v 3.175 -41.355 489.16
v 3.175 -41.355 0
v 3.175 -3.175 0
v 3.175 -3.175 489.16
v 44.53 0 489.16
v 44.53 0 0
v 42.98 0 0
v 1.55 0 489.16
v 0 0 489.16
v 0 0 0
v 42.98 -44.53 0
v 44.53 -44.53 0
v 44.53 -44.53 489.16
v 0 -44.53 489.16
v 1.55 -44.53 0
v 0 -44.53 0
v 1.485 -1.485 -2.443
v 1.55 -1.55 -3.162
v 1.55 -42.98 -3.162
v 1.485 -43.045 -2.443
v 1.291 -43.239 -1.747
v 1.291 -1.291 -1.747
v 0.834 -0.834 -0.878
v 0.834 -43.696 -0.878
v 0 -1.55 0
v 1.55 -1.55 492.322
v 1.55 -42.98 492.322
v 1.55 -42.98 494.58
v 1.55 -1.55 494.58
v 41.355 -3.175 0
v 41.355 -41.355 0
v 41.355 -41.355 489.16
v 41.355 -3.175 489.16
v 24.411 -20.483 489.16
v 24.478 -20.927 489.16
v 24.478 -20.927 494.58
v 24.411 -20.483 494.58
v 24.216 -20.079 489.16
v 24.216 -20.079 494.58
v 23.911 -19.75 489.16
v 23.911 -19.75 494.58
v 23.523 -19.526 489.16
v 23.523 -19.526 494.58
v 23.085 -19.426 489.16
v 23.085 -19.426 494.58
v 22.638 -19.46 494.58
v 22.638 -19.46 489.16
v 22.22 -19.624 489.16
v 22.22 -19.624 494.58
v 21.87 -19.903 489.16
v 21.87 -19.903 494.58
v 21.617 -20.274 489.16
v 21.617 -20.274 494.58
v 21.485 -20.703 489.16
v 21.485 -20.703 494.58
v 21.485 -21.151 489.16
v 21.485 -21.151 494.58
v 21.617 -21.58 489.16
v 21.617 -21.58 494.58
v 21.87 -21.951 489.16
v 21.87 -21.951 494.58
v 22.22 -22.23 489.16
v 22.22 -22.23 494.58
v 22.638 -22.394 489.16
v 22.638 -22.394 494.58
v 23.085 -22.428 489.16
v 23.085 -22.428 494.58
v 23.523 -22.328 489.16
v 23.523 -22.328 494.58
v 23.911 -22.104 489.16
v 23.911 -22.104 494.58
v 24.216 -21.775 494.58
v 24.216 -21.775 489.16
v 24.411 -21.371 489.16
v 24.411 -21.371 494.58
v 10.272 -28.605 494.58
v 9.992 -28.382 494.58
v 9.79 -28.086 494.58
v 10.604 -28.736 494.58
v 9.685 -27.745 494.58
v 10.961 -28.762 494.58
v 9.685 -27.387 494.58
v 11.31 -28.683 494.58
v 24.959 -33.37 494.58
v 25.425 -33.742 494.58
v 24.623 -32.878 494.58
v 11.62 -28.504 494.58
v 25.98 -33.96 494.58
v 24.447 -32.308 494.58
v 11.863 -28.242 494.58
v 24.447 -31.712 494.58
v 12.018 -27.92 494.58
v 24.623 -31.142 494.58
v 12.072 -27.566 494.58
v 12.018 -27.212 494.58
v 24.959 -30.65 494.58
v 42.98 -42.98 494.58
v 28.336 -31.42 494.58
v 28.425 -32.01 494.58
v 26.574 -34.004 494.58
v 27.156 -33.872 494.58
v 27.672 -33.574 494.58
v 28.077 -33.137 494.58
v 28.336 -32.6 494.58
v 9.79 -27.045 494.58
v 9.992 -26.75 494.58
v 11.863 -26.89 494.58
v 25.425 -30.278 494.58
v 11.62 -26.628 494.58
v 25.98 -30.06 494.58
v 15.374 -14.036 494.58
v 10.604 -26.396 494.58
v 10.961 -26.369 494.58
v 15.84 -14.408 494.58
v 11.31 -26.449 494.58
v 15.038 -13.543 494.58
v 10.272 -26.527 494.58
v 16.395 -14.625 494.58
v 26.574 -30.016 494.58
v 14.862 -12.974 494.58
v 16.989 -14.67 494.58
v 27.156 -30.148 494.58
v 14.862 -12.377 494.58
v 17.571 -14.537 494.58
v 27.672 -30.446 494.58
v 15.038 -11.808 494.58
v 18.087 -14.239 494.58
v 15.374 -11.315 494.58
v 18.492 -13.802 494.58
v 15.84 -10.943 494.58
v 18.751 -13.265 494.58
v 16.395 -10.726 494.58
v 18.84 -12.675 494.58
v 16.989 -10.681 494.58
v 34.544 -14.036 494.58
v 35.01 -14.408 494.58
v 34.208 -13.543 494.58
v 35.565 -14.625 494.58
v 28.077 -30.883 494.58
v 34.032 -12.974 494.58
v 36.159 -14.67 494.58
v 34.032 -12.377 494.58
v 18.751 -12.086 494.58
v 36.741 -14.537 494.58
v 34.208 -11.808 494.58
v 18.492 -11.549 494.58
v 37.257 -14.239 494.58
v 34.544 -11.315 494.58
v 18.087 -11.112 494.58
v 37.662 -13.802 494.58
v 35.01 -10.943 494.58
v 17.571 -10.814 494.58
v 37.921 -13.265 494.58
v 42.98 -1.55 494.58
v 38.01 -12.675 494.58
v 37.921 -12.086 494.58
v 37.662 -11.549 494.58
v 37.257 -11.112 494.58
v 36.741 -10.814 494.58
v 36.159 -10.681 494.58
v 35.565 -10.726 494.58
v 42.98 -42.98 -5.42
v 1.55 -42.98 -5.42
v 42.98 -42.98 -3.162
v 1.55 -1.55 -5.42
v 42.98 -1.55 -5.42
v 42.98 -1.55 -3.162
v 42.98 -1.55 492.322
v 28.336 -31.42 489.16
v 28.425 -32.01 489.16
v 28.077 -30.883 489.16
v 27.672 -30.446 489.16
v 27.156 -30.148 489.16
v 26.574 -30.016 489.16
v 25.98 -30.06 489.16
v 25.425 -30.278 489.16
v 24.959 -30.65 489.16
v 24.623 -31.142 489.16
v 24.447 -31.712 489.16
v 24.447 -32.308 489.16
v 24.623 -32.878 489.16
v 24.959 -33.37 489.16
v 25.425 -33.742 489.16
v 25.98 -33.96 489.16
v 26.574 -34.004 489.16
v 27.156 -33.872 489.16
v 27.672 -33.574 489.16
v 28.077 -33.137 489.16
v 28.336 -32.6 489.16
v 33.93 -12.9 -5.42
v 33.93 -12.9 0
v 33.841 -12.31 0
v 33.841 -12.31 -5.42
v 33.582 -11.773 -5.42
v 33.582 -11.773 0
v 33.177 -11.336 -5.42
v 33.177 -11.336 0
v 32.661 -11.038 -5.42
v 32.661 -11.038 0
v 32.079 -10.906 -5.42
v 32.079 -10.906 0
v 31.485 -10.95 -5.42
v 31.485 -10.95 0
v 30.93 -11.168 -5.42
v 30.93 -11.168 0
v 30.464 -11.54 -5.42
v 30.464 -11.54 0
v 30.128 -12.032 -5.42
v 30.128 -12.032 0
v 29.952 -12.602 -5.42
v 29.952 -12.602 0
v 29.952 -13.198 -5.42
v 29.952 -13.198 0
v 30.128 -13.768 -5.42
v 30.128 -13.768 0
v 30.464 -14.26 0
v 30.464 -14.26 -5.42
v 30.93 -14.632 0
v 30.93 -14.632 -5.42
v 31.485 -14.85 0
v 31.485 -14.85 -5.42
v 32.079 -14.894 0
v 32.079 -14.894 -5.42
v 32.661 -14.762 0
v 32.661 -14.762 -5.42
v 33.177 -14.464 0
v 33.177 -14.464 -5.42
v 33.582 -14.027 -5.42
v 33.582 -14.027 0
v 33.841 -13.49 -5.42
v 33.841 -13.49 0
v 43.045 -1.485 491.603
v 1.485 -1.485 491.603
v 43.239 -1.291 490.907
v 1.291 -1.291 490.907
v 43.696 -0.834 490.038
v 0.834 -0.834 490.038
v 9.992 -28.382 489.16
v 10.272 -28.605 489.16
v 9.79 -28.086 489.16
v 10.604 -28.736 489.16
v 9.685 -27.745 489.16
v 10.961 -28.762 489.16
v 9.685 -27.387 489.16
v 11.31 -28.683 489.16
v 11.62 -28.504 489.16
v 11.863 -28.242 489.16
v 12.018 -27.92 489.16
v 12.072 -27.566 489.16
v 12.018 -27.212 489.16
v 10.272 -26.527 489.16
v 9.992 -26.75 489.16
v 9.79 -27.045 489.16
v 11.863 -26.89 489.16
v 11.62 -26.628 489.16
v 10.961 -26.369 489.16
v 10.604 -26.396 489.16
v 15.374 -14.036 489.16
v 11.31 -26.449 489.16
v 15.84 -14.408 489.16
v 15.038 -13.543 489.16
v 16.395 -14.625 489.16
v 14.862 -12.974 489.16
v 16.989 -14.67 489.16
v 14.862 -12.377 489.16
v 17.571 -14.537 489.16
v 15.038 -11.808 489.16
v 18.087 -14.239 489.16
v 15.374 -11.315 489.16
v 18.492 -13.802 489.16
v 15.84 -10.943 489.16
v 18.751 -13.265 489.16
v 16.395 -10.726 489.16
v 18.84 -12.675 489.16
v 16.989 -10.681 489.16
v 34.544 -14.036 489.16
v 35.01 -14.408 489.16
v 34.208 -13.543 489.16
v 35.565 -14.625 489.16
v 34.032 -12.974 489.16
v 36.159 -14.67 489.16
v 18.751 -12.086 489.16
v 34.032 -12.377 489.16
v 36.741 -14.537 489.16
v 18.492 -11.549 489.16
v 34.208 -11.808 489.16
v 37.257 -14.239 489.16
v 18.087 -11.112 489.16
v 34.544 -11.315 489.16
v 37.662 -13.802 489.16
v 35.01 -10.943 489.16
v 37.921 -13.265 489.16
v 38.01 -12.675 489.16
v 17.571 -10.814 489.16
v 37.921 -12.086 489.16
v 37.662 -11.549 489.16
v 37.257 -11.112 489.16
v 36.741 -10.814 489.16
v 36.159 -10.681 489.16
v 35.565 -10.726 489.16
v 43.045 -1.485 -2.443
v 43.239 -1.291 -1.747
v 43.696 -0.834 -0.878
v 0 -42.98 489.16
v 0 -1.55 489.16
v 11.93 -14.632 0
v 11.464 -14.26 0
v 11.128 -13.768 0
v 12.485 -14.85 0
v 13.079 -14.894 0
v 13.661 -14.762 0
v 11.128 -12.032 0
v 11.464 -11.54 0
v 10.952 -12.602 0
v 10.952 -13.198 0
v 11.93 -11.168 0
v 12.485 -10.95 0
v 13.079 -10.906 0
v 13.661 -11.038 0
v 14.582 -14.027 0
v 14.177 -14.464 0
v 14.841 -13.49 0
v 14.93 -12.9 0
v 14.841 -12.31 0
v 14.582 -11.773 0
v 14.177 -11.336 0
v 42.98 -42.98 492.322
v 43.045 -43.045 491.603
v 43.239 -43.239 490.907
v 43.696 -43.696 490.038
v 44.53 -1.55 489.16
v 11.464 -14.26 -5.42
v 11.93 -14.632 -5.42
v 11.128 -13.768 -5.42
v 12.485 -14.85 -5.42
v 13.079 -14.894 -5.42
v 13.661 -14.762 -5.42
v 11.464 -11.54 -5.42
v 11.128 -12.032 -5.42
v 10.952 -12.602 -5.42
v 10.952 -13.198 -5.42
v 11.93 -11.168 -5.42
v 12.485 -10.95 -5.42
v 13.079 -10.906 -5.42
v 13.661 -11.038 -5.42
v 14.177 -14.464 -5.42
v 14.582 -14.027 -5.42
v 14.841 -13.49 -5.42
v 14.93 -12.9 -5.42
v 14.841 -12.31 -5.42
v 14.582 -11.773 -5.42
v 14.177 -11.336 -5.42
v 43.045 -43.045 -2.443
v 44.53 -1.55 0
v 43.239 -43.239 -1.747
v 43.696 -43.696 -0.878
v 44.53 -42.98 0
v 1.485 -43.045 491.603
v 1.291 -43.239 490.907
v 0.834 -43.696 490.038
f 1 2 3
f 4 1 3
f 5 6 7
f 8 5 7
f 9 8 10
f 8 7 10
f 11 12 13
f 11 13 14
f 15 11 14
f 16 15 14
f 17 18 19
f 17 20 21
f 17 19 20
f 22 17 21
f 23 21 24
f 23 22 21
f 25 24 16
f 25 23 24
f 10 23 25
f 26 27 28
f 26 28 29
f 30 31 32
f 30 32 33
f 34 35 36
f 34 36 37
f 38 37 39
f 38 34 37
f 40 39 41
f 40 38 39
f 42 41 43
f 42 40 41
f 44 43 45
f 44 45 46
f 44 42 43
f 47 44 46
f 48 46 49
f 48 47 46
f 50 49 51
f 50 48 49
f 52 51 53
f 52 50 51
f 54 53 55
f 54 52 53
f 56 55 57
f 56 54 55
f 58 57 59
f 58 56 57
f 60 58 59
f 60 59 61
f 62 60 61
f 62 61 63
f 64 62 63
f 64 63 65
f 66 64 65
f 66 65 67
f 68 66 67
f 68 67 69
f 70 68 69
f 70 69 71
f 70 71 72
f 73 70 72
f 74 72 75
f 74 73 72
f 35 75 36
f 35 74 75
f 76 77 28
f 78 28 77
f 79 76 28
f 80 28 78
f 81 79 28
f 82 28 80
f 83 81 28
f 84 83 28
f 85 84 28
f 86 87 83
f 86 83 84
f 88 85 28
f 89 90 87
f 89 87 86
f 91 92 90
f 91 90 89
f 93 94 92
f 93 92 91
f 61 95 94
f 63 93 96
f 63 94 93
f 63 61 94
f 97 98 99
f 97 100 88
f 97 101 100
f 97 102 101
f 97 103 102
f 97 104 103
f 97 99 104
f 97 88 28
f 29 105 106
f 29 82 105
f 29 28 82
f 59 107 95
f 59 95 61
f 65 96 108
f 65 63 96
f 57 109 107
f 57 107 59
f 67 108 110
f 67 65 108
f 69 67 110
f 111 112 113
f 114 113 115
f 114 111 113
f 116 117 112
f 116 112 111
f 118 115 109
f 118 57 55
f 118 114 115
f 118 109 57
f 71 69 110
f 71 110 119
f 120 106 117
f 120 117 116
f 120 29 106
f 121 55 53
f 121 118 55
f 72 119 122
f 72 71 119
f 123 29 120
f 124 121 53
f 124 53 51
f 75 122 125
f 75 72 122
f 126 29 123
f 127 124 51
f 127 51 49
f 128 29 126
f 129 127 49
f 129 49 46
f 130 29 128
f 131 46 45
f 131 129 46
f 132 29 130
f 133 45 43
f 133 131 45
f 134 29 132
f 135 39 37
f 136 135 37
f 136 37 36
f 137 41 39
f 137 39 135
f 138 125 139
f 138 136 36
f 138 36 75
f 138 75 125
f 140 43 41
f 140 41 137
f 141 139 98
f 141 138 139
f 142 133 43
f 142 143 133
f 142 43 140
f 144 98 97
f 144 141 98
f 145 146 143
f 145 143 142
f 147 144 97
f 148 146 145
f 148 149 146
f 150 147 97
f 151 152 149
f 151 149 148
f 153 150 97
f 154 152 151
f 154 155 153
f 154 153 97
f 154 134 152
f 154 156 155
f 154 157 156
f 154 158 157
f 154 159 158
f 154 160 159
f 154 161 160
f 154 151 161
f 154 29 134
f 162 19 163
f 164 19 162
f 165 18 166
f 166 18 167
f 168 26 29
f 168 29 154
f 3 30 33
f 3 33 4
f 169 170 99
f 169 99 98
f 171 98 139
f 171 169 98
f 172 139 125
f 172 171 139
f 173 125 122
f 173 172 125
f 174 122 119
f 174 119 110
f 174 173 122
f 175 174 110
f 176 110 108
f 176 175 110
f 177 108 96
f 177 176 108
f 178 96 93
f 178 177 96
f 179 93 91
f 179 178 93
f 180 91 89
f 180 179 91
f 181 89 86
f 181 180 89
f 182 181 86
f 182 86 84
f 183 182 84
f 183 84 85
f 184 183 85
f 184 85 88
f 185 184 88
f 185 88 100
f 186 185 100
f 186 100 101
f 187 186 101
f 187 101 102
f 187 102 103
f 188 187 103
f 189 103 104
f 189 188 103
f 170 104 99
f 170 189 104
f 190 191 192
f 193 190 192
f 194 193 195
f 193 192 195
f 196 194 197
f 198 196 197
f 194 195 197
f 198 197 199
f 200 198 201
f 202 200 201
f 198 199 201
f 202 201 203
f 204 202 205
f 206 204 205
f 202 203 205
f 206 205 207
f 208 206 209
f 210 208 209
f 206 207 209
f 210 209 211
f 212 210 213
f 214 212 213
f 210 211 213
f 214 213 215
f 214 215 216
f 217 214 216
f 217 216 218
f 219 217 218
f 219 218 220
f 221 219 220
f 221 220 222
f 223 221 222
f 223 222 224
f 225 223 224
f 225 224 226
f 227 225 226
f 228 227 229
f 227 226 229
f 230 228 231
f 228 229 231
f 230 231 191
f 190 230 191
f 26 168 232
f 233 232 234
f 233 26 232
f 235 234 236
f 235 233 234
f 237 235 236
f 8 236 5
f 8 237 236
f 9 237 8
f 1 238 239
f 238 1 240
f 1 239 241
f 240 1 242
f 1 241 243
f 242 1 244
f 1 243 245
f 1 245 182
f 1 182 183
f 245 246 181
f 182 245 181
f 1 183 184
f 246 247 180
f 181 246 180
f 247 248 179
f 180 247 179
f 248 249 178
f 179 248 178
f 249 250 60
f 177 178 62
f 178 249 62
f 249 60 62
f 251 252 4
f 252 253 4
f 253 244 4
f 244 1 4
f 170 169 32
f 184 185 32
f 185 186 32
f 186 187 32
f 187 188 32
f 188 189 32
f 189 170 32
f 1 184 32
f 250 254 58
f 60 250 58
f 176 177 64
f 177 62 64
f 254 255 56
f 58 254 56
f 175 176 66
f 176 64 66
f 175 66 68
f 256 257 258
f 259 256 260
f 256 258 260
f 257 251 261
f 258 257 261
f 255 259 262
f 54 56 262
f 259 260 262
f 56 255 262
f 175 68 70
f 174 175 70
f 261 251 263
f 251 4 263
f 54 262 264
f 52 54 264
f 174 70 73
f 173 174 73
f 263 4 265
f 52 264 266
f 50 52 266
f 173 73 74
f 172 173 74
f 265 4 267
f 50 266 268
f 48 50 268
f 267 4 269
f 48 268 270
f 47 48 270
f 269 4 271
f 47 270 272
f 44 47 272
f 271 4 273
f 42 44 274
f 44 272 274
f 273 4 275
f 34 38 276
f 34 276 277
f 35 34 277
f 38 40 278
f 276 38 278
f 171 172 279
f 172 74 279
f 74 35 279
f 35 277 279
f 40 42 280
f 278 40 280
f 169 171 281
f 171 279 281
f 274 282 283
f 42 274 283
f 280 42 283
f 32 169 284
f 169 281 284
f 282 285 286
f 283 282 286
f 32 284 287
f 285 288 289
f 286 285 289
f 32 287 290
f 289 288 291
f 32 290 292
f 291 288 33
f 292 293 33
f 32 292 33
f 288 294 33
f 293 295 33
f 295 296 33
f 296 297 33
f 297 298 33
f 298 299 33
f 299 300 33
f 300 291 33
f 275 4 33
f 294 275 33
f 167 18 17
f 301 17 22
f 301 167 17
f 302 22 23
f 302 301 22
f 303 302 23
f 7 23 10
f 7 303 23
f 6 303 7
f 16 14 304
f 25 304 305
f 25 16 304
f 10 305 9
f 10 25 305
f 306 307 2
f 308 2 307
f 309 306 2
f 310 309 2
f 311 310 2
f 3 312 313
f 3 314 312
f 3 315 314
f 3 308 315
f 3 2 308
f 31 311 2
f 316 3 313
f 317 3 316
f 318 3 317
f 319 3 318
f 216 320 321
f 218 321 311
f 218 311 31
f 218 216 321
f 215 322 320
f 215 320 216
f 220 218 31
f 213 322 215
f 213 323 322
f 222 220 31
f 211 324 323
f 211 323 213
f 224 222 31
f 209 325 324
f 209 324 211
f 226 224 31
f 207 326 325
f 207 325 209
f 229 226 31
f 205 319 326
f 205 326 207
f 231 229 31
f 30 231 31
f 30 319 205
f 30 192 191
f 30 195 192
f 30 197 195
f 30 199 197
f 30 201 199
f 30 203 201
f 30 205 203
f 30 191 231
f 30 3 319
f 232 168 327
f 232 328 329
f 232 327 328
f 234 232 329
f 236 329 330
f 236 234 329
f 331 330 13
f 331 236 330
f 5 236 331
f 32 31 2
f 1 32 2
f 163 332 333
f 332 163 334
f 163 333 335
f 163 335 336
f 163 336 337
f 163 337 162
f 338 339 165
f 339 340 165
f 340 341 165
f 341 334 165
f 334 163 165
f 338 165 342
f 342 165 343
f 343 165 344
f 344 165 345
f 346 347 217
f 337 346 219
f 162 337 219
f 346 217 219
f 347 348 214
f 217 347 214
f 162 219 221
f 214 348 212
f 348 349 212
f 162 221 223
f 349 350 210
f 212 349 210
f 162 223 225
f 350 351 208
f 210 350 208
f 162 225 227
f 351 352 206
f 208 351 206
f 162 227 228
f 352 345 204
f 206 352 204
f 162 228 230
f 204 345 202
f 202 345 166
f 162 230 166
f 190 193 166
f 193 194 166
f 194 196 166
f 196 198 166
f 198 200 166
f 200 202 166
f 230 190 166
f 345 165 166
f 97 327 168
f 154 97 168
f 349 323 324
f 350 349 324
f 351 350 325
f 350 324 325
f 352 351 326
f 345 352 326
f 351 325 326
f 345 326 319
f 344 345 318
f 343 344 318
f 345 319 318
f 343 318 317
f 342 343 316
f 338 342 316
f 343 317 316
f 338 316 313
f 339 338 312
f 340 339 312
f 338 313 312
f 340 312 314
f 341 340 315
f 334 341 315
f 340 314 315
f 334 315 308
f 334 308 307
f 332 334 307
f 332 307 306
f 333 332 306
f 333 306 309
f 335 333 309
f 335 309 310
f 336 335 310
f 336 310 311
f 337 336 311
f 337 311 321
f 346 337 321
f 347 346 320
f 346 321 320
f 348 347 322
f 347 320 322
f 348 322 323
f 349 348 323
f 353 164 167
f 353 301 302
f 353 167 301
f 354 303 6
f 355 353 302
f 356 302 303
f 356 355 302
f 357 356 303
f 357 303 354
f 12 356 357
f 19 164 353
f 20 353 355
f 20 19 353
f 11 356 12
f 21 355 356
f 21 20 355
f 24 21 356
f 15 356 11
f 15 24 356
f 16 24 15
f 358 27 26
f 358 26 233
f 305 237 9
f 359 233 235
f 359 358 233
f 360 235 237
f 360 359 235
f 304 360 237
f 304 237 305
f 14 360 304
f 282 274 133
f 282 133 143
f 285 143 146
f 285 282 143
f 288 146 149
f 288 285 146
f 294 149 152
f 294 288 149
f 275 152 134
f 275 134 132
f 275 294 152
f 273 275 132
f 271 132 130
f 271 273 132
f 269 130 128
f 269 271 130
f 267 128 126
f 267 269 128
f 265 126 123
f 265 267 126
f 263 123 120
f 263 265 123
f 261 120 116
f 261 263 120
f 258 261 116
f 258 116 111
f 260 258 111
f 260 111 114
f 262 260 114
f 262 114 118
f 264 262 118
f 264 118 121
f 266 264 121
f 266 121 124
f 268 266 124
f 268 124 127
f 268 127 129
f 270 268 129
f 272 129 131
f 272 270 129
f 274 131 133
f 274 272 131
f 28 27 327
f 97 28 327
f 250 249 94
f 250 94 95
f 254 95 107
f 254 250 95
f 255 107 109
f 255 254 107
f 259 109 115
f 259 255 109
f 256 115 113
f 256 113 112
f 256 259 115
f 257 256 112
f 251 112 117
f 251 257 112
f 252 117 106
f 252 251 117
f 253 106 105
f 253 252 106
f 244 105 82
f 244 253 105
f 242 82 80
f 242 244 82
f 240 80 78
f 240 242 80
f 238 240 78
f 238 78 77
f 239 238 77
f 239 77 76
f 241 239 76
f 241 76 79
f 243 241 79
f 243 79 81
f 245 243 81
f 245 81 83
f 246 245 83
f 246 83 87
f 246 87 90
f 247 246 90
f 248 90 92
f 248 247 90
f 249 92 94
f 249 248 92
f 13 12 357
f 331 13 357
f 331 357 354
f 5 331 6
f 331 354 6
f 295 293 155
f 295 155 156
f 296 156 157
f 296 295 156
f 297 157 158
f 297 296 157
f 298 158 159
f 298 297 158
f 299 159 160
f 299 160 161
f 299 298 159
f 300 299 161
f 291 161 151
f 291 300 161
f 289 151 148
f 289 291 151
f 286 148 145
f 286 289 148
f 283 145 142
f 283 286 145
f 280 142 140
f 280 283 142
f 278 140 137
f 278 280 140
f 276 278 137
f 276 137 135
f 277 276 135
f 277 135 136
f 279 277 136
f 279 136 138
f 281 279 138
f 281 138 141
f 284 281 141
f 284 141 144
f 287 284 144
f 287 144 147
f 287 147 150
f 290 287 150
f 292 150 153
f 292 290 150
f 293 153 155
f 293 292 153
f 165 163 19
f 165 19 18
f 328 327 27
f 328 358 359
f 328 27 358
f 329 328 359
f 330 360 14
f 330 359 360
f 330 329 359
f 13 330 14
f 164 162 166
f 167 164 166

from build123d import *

# Parameters (mm, degrees)
SKETCH1_W           = 41.43
SKETCH1_H           = 41.43
SKETCH1_R           = 2
BOSS_EXTRUDE1_DEPTH = 5.42
SKETCH2_W           = 44.53
SKETCH2_H           = 44.53
SKETCH2_W_2         = 38.18
SKETCH2_H_2         = 38.18
BOSS_EXTRUDE2_DEPTH = 489.16
SKETCH3_W           = 41.43
SKETCH3_H           = 41.43
SKETCH3_R           = 2
SKETCH3_R_2         = 1.505
SKETCH3_R_3         = 1.2
BOSS_EXTRUDE3_DEPTH = 5.42
FILLET1_R           = 4


with BuildPart() as part:
    # Sketch1 → Boss-Extrude1 (new body)
    with BuildSketch(Plane.XY):
        with Locations((22.265, -22.265)):
            Rectangle(SKETCH1_W, SKETCH1_H)
        with Locations((12.93, -12.9)):
            Circle(SKETCH1_R, mode=Mode.SUBTRACT)
        with Locations((31.93, -12.9)):
            Circle(SKETCH1_R, mode=Mode.SUBTRACT)
    extrude(amount=-BOSS_EXTRUDE1_DEPTH)

    # Sketch2 → Boss-Extrude2 (add)
    with BuildSketch(Plane(origin=(0, 0, 0), x_dir=(-1, 0, 0), z_dir=(0, 0, -1))):
        with Locations((-22.265, -22.265)):
            Rectangle(SKETCH2_W, SKETCH2_H)
        with Locations((-22.265, -22.265)):
            Rectangle(SKETCH2_W_2, SKETCH2_H_2, mode=Mode.SUBTRACT)
    extrude(amount=-BOSS_EXTRUDE2_DEPTH)

    # Sketch3 → Boss-Extrude3 (add)
    with BuildSketch(Plane.XY.offset(489.16)):
        with Locations((22.265, -22.265)):
            Rectangle(SKETCH3_W, SKETCH3_H)
        with Locations((16.84, -12.675466776)):
            Circle(SKETCH3_R, mode=Mode.SUBTRACT)
        with Locations((36.01, -12.675466776)):
            Circle(SKETCH3_R, mode=Mode.SUBTRACT)
        with Locations((26.425, -32.01)):
            Circle(SKETCH3_R, mode=Mode.SUBTRACT)
        with Locations((22.97275137, -20.926955012)):
            Circle(SKETCH3_R_2, mode=Mode.SUBTRACT)
        with Locations((10.8715013, -27.565833881)):
            Circle(SKETCH3_R_3, mode=Mode.SUBTRACT)
    extrude(amount=BOSS_EXTRUDE3_DEPTH)

    # Fillet1
    # the kernel refuses this fillet: 4 mm, written as the material it adds along each edge
    with BuildSketch(Plane(origin=(1.55, -42.98, 0), x_dir=(0, -1, 0), z_dir=(1, 0, 0)), Plane(origin=(1.55, -42.98, 489.16), x_dir=(-1, 0, 0), z_dir=(0, 1, 0)), Plane(origin=(42.98, -42.98, 489.16), x_dir=(0, -1, 0), z_dir=(-1, 0, 0)), Plane(origin=(42.98, -1.55, 489.16), x_dir=(1, 0, 0), z_dir=(0, -1, 0)), Plane(origin=(1.55, -1.55, 489.16), x_dir=(0, 1, 0), z_dir=(1, 0, 0))) as fillet1_piece_1:
        with BuildLine():
            CenterArc((4, 3.161882351), FILLET1_R, 180, 52.229510411)
            Line((0, 3.161882351), (-0.08, 3.161882351))
            Line((-0.08, 3.161882351), (-0.08, 0))
            Line((-0.08, 0), (0, -0.08))
            ThreePointArc((0, -0.08), (0.775, -0.08), (1.501, -0.063237647))
            Line((1.501, -0.063237647), (1.55, 0))
        make_face()
    extrude(amount=41.43)
    with BuildSketch(Plane(origin=(1.55, -1.55, 0), x_dir=(0, 0, -1), z_dir=(0, -1, 0)), Plane(origin=(42.98, -1.55, 0), x_dir=(0, 0, -1), z_dir=(-1, 0, 0)), Plane(origin=(42.98, -42.98, 0), x_dir=(0, 0, -1), z_dir=(0, 1, 0))) as fillet1_piece_2:
        with BuildLine():
            CenterArc((3.161882351, -4), FILLET1_R, 90, 52.229510411)
            Line((0, -1.55), (-0.063237647, -1.501))
            ThreePointArc((-0.063237647, -1.501), (-0.08, -0.775), (-0.08, 0))
            Line((-0.08, 0), (0, 0.08))
            Line((0, 0.08), (3.161882351, 0.08))
            Line((3.161882351, 0.08), (3.161882351, 0))
        make_face()
    extrude(amount=41.43)
    with BuildSketch(Plane(origin=(1.55, -1.55, 0), x_dir=(0, 0, -1), z_dir=(0, -1, 0))) as fillet1_piece_3a_section:
        with BuildLine():
            CenterArc((3.161882351, -4), FILLET1_R, 90, 52.229510411)
            Line((0, -1.55), (-0.063237647, -1.501))
            ThreePointArc((-0.063237647, -1.501), (-0.08, -0.775), (-0.08, 0))
            Line((-0.08, 0), (0, 0.08))
            Line((0, 0.08), (3.161882351, 0.08))
            Line((3.161882351, 0.08), (3.161882351, 0))
        make_face()
    fillet1_piece_3a = extrude(amount=49.334705877, mode=Mode.PRIVATE)
    fillet1_piece_3a = split(fillet1_piece_3a, bisect_by=Plane(origin=(1.154343324, -42.98, -0.817162135), z_dir=(0, -1, 0)), keep=Keep.TOP, mode=Mode.PRIVATE)
    fillet1_piece_3a = split(fillet1_piece_3a, bisect_by=Plane(origin=(1.154343324, -44.53, -0.817162135), z_dir=(0, 1, 0)), keep=Keep.TOP, mode=Mode.PRIVATE)
    with BuildSketch(Plane(origin=(-6.354705877, -42.98, 0), x_dir=(0, -1, 0), z_dir=(1, 0, 0))) as fillet1_piece_3b_section:
        with BuildLine():
            CenterArc((4, 3.161882351), FILLET1_R, 180, 52.229510411)
            Line((0, 3.161882351), (-0.08, 3.161882351))
            Line((-0.08, 3.161882351), (-0.08, 0))
            Line((-0.08, 0), (0, -0.08))
            ThreePointArc((0, -0.08), (0.775, -0.08), (1.501, -0.063237647))
            Line((1.501, -0.063237647), (1.55, 0))
        make_face()
    fillet1_piece_3b = extrude(amount=49.334705877, mode=Mode.PRIVATE)
    fillet1_piece_3b = split(fillet1_piece_3b, bisect_by=Plane(origin=(1.55, -43.375656676, -0.817162135), z_dir=(-1, 0, 0)), keep=Keep.TOP, mode=Mode.PRIVATE)
    fillet1_piece_3b = split(fillet1_piece_3b, bisect_by=Plane(origin=(0, -43.375656676, -0.817162135), z_dir=(1, 0, 0)), keep=Keep.TOP, mode=Mode.PRIVATE)
    fillet1_piece_3 = fillet1_piece_3a & fillet1_piece_3b
    add(fillet1_piece_3)
    with BuildSketch(Plane(origin=(42.98, -50.884705877, 0), x_dir=(0, 0, -1), z_dir=(0, 1, 0))) as fillet1_piece_4a_section:
        with BuildLine():
            CenterArc((3.161882351, -4), FILLET1_R, 90, 52.229510411)
            Line((0, -1.55), (-0.063237647, -1.501))
            ThreePointArc((-0.063237647, -1.501), (-0.08, -0.775), (-0.08, 0))
            Line((-0.08, 0), (0, 0.08))
            Line((0, 0.08), (3.161882351, 0.08))
            Line((3.161882351, 0.08), (3.161882351, 0))
        make_face()
    fillet1_piece_4a = extrude(amount=49.334705877, mode=Mode.PRIVATE)
    fillet1_piece_4a = split(fillet1_piece_4a, bisect_by=Plane(origin=(43.375656676, -42.98, -0.817162135), z_dir=(0, -1, 0)), keep=Keep.TOP, mode=Mode.PRIVATE)
    fillet1_piece_4a = split(fillet1_piece_4a, bisect_by=Plane(origin=(43.375656676, -44.53, -0.817162135), z_dir=(0, 1, 0)), keep=Keep.TOP, mode=Mode.PRIVATE)
    with BuildSketch(Plane(origin=(1.55, -42.98, 0), x_dir=(0, -1, 0), z_dir=(1, 0, 0))) as fillet1_piece_4b_section:
        with BuildLine():
            CenterArc((4, 3.161882351), FILLET1_R, 180, 52.229510411)
            Line((0, 3.161882351), (-0.08, 3.161882351))
            Line((-0.08, 3.161882351), (-0.08, 0))
            Line((-0.08, 0), (0, -0.08))
            ThreePointArc((0, -0.08), (0.775, -0.08), (1.501, -0.063237647))
            Line((1.501, -0.063237647), (1.55, 0))
        make_face()
    fillet1_piece_4b = extrude(amount=49.334705877, mode=Mode.PRIVATE)
    fillet1_piece_4b = split(fillet1_piece_4b, bisect_by=Plane(origin=(42.98, -43.375656676, -0.817162135), z_dir=(1, 0, 0)), keep=Keep.TOP, mode=Mode.PRIVATE)
    fillet1_piece_4b = split(fillet1_piece_4b, bisect_by=Plane(origin=(44.53, -43.375656676, -0.817162135), z_dir=(-1, 0, 0)), keep=Keep.TOP, mode=Mode.PRIVATE)
    fillet1_piece_4 = fillet1_piece_4a & fillet1_piece_4b
    add(fillet1_piece_4)
    with BuildSketch(Plane(origin=(42.98, -1.55, 0), x_dir=(0, 0, -1), z_dir=(-1, 0, 0))) as fillet1_piece_5a_section:
        with BuildLine():
            CenterArc((3.161882351, -4), FILLET1_R, 90, 52.229510411)
            Line((0, -1.55), (-0.063237647, -1.501))
            ThreePointArc((-0.063237647, -1.501), (-0.08, -0.775), (-0.08, 0))
            Line((-0.08, 0), (0, 0.08))
            Line((0, 0.08), (3.161882351, 0.08))
            Line((3.161882351, 0.08), (3.161882351, 0))
        make_face()
    fillet1_piece_5a = extrude(amount=49.334705877, mode=Mode.PRIVATE)
    fillet1_piece_5a = split(fillet1_piece_5a, bisect_by=Plane(origin=(1.55, -1.154343324, -0.817162135), z_dir=(-1, 0, 0)), keep=Keep.TOP, mode=Mode.PRIVATE)
    fillet1_piece_5a = split(fillet1_piece_5a, bisect_by=Plane(origin=(0, -1.154343324, -0.817162135), z_dir=(1, 0, 0)), keep=Keep.TOP, mode=Mode.PRIVATE)
    with BuildSketch(Plane(origin=(1.55, 6.354705877, 0), x_dir=(0, 0, -1), z_dir=(0, -1, 0))) as fillet1_piece_5b_section:
        with BuildLine():
            CenterArc((3.161882351, -4), FILLET1_R, 90, 52.229510411)
            Line((0, -1.55), (-0.063237647, -1.501))
            ThreePointArc((-0.063237647, -1.501), (-0.08, -0.775), (-0.08, 0))
            Line((-0.08, 0), (0, 0.08))
            Line((0, 0.08), (3.161882351, 0.08))
            Line((3.161882351, 0.08), (3.161882351, 0))
        make_face()
    fillet1_piece_5b = extrude(amount=49.334705877, mode=Mode.PRIVATE)
    fillet1_piece_5b = split(fillet1_piece_5b, bisect_by=Plane(origin=(1.154343324, -1.55, -0.817162135), z_dir=(0, 1, 0)), keep=Keep.TOP, mode=Mode.PRIVATE)
    fillet1_piece_5b = split(fillet1_piece_5b, bisect_by=Plane(origin=(1.154343324, 0, -0.817162135), z_dir=(0, -1, 0)), keep=Keep.TOP, mode=Mode.PRIVATE)
    fillet1_piece_5 = fillet1_piece_5a & fillet1_piece_5b
    add(fillet1_piece_5)
    with BuildSketch(Plane(origin=(42.98, -42.98, 489.16), x_dir=(0, -1, 0), z_dir=(-1, 0, 0))) as fillet1_piece_6a_section:
        with BuildLine():
            CenterArc((4, 3.161882351), FILLET1_R, 180, 52.229510411)
            Line((0, 3.161882351), (-0.08, 3.161882351))
            Line((-0.08, 3.161882351), (-0.08, 0))
            Line((-0.08, 0), (0, -0.08))
            ThreePointArc((0, -0.08), (0.775, -0.08), (1.501, -0.063237647))
            Line((1.501, -0.063237647), (1.55, 0))
        make_face()
    fillet1_piece_6a = extrude(amount=49.334705877, mode=Mode.PRIVATE)
    fillet1_piece_6a = split(fillet1_piece_6a, bisect_by=Plane(origin=(0, -43.375656676, 489.977162135), z_dir=(1, 0, 0)), keep=Keep.TOP, mode=Mode.PRIVATE)
    fillet1_piece_6a = split(fillet1_piece_6a, bisect_by=Plane(origin=(1.55, -43.375656676, 489.977162135), z_dir=(-1, 0, 0)), keep=Keep.TOP, mode=Mode.PRIVATE)
    with BuildSketch(Plane(origin=(1.55, -50.884705877, 489.16), x_dir=(-1, 0, 0), z_dir=(0, 1, 0))) as fillet1_piece_6b_section:
        with BuildLine():
            CenterArc((4, 3.161882351), FILLET1_R, 180, 52.229510411)
            Line((0, 3.161882351), (-0.08, 3.161882351))
            Line((-0.08, 3.161882351), (-0.08, 0))
            Line((-0.08, 0), (0, -0.08))
            ThreePointArc((0, -0.08), (0.775, -0.08), (1.501, -0.063237647))
            Line((1.501, -0.063237647), (1.55, 0))
        make_face()
    fillet1_piece_6b = extrude(amount=49.334705877, mode=Mode.PRIVATE)
    fillet1_piece_6b = split(fillet1_piece_6b, bisect_by=Plane(origin=(1.154343324, -44.53, 489.977162135), z_dir=(0, 1, 0)), keep=Keep.TOP, mode=Mode.PRIVATE)
    fillet1_piece_6b = split(fillet1_piece_6b, bisect_by=Plane(origin=(1.154343324, -42.98, 489.977162135), z_dir=(0, -1, 0)), keep=Keep.TOP, mode=Mode.PRIVATE)
    fillet1_piece_6 = fillet1_piece_6a & fillet1_piece_6b
    add(fillet1_piece_6)
    with BuildSketch(Plane(origin=(-6.354705877, -1.55, 489.16), x_dir=(0, 1, 0), z_dir=(1, 0, 0))) as fillet1_piece_7a_section:
        with BuildLine():
            CenterArc((4, 3.161882351), FILLET1_R, 180, 52.229510411)
            Line((0, 3.161882351), (-0.08, 3.161882351))
            Line((-0.08, 3.161882351), (-0.08, 0))
            Line((-0.08, 0), (0, -0.08))
            ThreePointArc((0, -0.08), (0.775, -0.08), (1.501, -0.063237647))
            Line((1.501, -0.063237647), (1.55, 0))
        make_face()
    fillet1_piece_7a = extrude(amount=49.334705877, mode=Mode.PRIVATE)
    fillet1_piece_7a = split(fillet1_piece_7a, bisect_by=Plane(origin=(0, -1.154343324, 489.977162135), z_dir=(1, 0, 0)), keep=Keep.TOP, mode=Mode.PRIVATE)
    fillet1_piece_7a = split(fillet1_piece_7a, bisect_by=Plane(origin=(1.55, -1.154343324, 489.977162135), z_dir=(-1, 0, 0)), keep=Keep.TOP, mode=Mode.PRIVATE)
    with BuildSketch(Plane(origin=(1.55, -42.98, 489.16), x_dir=(-1, 0, 0), z_dir=(0, 1, 0))) as fillet1_piece_7b_section:
        with BuildLine():
            CenterArc((4, 3.161882351), FILLET1_R, 180, 52.229510411)
            Line((0, 3.161882351), (-0.08, 3.161882351))
            Line((-0.08, 3.161882351), (-0.08, 0))
            Line((-0.08, 0), (0, -0.08))
            ThreePointArc((0, -0.08), (0.775, -0.08), (1.501, -0.063237647))
            Line((1.501, -0.063237647), (1.55, 0))
        make_face()
    fillet1_piece_7b = extrude(amount=49.334705877, mode=Mode.PRIVATE)
    fillet1_piece_7b = split(fillet1_piece_7b, bisect_by=Plane(origin=(1.154343324, 0, 489.977162135), z_dir=(0, -1, 0)), keep=Keep.TOP, mode=Mode.PRIVATE)
    fillet1_piece_7b = split(fillet1_piece_7b, bisect_by=Plane(origin=(1.154343324, -1.55, 489.977162135), z_dir=(0, 1, 0)), keep=Keep.TOP, mode=Mode.PRIVATE)
    fillet1_piece_7 = fillet1_piece_7a & fillet1_piece_7b
    add(fillet1_piece_7)
    with BuildSketch(Plane(origin=(42.98, -1.55, 489.16), x_dir=(1, 0, 0), z_dir=(0, -1, 0))) as fillet1_piece_8a_section:
        with BuildLine():
            CenterArc((4, 3.161882351), FILLET1_R, 180, 52.229510411)
            Line((0, 3.161882351), (-0.08, 3.161882351))
            Line((-0.08, 3.161882351), (-0.08, 0))
            Line((-0.08, 0), (0, -0.08))
            ThreePointArc((0, -0.08), (0.775, -0.08), (1.501, -0.063237647))
            Line((1.501, -0.063237647), (1.55, 0))
        make_face()
    fillet1_piece_8a = extrude(amount=49.334705877, mode=Mode.PRIVATE)
    fillet1_piece_8a = split(fillet1_piece_8a, bisect_by=Plane(origin=(43.375656676, -44.53, 489.977162135), z_dir=(0, 1, 0)), keep=Keep.TOP, mode=Mode.PRIVATE)
    fillet1_piece_8a = split(fillet1_piece_8a, bisect_by=Plane(origin=(43.375656676, -42.98, 489.977162135), z_dir=(0, -1, 0)), keep=Keep.TOP, mode=Mode.PRIVATE)
    with BuildSketch(Plane(origin=(50.884705877, -42.98, 489.16), x_dir=(0, -1, 0), z_dir=(-1, 0, 0))) as fillet1_piece_8b_section:
        with BuildLine():
            CenterArc((4, 3.161882351), FILLET1_R, 180, 52.229510411)
            Line((0, 3.161882351), (-0.08, 3.161882351))
            Line((-0.08, 3.161882351), (-0.08, 0))
            Line((-0.08, 0), (0, -0.08))
            ThreePointArc((0, -0.08), (0.775, -0.08), (1.501, -0.063237647))
            Line((1.501, -0.063237647), (1.55, 0))
        make_face()
    fillet1_piece_8b = extrude(amount=49.334705877, mode=Mode.PRIVATE)
    fillet1_piece_8b = split(fillet1_piece_8b, bisect_by=Plane(origin=(44.53, -43.375656676, 489.977162135), z_dir=(-1, 0, 0)), keep=Keep.TOP, mode=Mode.PRIVATE)
    fillet1_piece_8b = split(fillet1_piece_8b, bisect_by=Plane(origin=(42.98, -43.375656676, 489.977162135), z_dir=(1, 0, 0)), keep=Keep.TOP, mode=Mode.PRIVATE)
    fillet1_piece_8 = fillet1_piece_8a & fillet1_piece_8b
    add(fillet1_piece_8)
    with BuildSketch(Plane(origin=(1.55, -1.55, 489.16), x_dir=(0, 1, 0), z_dir=(1, 0, 0))) as fillet1_piece_9a_section:
        with BuildLine():
            CenterArc((4, 3.161882351), FILLET1_R, 180, 52.229510411)
            Line((0, 3.161882351), (-0.08, 3.161882351))
            Line((-0.08, 3.161882351), (-0.08, 0))
            Line((-0.08, 0), (0, -0.08))
            ThreePointArc((0, -0.08), (0.775, -0.08), (1.501, -0.063237647))
            Line((1.501, -0.063237647), (1.55, 0))
        make_face()
    fillet1_piece_9a = extrude(amount=49.334705877, mode=Mode.PRIVATE)
    fillet1_piece_9a = split(fillet1_piece_9a, bisect_by=Plane(origin=(44.53, -1.154343324, 489.977162135), z_dir=(-1, 0, 0)), keep=Keep.TOP, mode=Mode.PRIVATE)
    fillet1_piece_9a = split(fillet1_piece_9a, bisect_by=Plane(origin=(42.98, -1.154343324, 489.977162135), z_dir=(1, 0, 0)), keep=Keep.TOP, mode=Mode.PRIVATE)
    with BuildSketch(Plane(origin=(42.98, 6.354705877, 489.16), x_dir=(1, 0, 0), z_dir=(0, -1, 0))) as fillet1_piece_9b_section:
        with BuildLine():
            CenterArc((4, 3.161882351), FILLET1_R, 180, 52.229510411)
            Line((0, 3.161882351), (-0.08, 3.161882351))
            Line((-0.08, 3.161882351), (-0.08, 0))
            Line((-0.08, 0), (0, -0.08))
            ThreePointArc((0, -0.08), (0.775, -0.08), (1.501, -0.063237647))
            Line((1.501, -0.063237647), (1.55, 0))
        make_face()
    fillet1_piece_9b = extrude(amount=49.334705877, mode=Mode.PRIVATE)
    fillet1_piece_9b = split(fillet1_piece_9b, bisect_by=Plane(origin=(43.375656676, 0, 489.977162135), z_dir=(0, -1, 0)), keep=Keep.TOP, mode=Mode.PRIVATE)
    fillet1_piece_9b = split(fillet1_piece_9b, bisect_by=Plane(origin=(43.375656676, -1.55, 489.977162135), z_dir=(0, 1, 0)), keep=Keep.TOP, mode=Mode.PRIVATE)
    fillet1_piece_9 = fillet1_piece_9a & fillet1_piece_9b
    add(fillet1_piece_9)
    with BuildSketch(Plane(origin=(50.884705877, -1.55, 0), x_dir=(0, 0, -1), z_dir=(-1, 0, 0))) as fillet1_piece_10a_section:
        with BuildLine():
            CenterArc((3.161882351, -4), FILLET1_R, 90, 52.229510411)
            Line((0, -1.55), (-0.063237647, -1.501))
            ThreePointArc((-0.063237647, -1.501), (-0.08, -0.775), (-0.08, 0))
            Line((-0.08, 0), (0, 0.08))
            Line((0, 0.08), (3.161882351, 0.08))
            Line((3.161882351, 0.08), (3.161882351, 0))
        make_face()
    fillet1_piece_10a = extrude(amount=49.334705877, mode=Mode.PRIVATE)
    fillet1_piece_10a = split(fillet1_piece_10a, bisect_by=Plane(origin=(42.98, -1.154343324, -0.817162135), z_dir=(1, 0, 0)), keep=Keep.TOP, mode=Mode.PRIVATE)
    fillet1_piece_10a = split(fillet1_piece_10a, bisect_by=Plane(origin=(44.53, -1.154343324, -0.817162135), z_dir=(-1, 0, 0)), keep=Keep.TOP, mode=Mode.PRIVATE)
    with BuildSketch(Plane(origin=(42.98, -42.98, 0), x_dir=(0, 0, -1), z_dir=(0, 1, 0))) as fillet1_piece_10b_section:
        with BuildLine():
            CenterArc((3.161882351, -4), FILLET1_R, 90, 52.229510411)
            Line((0, -1.55), (-0.063237647, -1.501))
            ThreePointArc((-0.063237647, -1.501), (-0.08, -0.775), (-0.08, 0))
            Line((-0.08, 0), (0, 0.08))
            Line((0, 0.08), (3.161882351, 0.08))
            Line((3.161882351, 0.08), (3.161882351, 0))
        make_face()
    fillet1_piece_10b = extrude(amount=49.334705877, mode=Mode.PRIVATE)
    fillet1_piece_10b = split(fillet1_piece_10b, bisect_by=Plane(origin=(43.375656676, -1.55, -0.817162135), z_dir=(0, 1, 0)), keep=Keep.TOP, mode=Mode.PRIVATE)
    fillet1_piece_10b = split(fillet1_piece_10b, bisect_by=Plane(origin=(43.375656676, 0, -0.817162135), z_dir=(0, -1, 0)), keep=Keep.TOP, mode=Mode.PRIVATE)
    fillet1_piece_10 = fillet1_piece_10a & fillet1_piece_10b
    add(fillet1_piece_10)


solid = part.part
